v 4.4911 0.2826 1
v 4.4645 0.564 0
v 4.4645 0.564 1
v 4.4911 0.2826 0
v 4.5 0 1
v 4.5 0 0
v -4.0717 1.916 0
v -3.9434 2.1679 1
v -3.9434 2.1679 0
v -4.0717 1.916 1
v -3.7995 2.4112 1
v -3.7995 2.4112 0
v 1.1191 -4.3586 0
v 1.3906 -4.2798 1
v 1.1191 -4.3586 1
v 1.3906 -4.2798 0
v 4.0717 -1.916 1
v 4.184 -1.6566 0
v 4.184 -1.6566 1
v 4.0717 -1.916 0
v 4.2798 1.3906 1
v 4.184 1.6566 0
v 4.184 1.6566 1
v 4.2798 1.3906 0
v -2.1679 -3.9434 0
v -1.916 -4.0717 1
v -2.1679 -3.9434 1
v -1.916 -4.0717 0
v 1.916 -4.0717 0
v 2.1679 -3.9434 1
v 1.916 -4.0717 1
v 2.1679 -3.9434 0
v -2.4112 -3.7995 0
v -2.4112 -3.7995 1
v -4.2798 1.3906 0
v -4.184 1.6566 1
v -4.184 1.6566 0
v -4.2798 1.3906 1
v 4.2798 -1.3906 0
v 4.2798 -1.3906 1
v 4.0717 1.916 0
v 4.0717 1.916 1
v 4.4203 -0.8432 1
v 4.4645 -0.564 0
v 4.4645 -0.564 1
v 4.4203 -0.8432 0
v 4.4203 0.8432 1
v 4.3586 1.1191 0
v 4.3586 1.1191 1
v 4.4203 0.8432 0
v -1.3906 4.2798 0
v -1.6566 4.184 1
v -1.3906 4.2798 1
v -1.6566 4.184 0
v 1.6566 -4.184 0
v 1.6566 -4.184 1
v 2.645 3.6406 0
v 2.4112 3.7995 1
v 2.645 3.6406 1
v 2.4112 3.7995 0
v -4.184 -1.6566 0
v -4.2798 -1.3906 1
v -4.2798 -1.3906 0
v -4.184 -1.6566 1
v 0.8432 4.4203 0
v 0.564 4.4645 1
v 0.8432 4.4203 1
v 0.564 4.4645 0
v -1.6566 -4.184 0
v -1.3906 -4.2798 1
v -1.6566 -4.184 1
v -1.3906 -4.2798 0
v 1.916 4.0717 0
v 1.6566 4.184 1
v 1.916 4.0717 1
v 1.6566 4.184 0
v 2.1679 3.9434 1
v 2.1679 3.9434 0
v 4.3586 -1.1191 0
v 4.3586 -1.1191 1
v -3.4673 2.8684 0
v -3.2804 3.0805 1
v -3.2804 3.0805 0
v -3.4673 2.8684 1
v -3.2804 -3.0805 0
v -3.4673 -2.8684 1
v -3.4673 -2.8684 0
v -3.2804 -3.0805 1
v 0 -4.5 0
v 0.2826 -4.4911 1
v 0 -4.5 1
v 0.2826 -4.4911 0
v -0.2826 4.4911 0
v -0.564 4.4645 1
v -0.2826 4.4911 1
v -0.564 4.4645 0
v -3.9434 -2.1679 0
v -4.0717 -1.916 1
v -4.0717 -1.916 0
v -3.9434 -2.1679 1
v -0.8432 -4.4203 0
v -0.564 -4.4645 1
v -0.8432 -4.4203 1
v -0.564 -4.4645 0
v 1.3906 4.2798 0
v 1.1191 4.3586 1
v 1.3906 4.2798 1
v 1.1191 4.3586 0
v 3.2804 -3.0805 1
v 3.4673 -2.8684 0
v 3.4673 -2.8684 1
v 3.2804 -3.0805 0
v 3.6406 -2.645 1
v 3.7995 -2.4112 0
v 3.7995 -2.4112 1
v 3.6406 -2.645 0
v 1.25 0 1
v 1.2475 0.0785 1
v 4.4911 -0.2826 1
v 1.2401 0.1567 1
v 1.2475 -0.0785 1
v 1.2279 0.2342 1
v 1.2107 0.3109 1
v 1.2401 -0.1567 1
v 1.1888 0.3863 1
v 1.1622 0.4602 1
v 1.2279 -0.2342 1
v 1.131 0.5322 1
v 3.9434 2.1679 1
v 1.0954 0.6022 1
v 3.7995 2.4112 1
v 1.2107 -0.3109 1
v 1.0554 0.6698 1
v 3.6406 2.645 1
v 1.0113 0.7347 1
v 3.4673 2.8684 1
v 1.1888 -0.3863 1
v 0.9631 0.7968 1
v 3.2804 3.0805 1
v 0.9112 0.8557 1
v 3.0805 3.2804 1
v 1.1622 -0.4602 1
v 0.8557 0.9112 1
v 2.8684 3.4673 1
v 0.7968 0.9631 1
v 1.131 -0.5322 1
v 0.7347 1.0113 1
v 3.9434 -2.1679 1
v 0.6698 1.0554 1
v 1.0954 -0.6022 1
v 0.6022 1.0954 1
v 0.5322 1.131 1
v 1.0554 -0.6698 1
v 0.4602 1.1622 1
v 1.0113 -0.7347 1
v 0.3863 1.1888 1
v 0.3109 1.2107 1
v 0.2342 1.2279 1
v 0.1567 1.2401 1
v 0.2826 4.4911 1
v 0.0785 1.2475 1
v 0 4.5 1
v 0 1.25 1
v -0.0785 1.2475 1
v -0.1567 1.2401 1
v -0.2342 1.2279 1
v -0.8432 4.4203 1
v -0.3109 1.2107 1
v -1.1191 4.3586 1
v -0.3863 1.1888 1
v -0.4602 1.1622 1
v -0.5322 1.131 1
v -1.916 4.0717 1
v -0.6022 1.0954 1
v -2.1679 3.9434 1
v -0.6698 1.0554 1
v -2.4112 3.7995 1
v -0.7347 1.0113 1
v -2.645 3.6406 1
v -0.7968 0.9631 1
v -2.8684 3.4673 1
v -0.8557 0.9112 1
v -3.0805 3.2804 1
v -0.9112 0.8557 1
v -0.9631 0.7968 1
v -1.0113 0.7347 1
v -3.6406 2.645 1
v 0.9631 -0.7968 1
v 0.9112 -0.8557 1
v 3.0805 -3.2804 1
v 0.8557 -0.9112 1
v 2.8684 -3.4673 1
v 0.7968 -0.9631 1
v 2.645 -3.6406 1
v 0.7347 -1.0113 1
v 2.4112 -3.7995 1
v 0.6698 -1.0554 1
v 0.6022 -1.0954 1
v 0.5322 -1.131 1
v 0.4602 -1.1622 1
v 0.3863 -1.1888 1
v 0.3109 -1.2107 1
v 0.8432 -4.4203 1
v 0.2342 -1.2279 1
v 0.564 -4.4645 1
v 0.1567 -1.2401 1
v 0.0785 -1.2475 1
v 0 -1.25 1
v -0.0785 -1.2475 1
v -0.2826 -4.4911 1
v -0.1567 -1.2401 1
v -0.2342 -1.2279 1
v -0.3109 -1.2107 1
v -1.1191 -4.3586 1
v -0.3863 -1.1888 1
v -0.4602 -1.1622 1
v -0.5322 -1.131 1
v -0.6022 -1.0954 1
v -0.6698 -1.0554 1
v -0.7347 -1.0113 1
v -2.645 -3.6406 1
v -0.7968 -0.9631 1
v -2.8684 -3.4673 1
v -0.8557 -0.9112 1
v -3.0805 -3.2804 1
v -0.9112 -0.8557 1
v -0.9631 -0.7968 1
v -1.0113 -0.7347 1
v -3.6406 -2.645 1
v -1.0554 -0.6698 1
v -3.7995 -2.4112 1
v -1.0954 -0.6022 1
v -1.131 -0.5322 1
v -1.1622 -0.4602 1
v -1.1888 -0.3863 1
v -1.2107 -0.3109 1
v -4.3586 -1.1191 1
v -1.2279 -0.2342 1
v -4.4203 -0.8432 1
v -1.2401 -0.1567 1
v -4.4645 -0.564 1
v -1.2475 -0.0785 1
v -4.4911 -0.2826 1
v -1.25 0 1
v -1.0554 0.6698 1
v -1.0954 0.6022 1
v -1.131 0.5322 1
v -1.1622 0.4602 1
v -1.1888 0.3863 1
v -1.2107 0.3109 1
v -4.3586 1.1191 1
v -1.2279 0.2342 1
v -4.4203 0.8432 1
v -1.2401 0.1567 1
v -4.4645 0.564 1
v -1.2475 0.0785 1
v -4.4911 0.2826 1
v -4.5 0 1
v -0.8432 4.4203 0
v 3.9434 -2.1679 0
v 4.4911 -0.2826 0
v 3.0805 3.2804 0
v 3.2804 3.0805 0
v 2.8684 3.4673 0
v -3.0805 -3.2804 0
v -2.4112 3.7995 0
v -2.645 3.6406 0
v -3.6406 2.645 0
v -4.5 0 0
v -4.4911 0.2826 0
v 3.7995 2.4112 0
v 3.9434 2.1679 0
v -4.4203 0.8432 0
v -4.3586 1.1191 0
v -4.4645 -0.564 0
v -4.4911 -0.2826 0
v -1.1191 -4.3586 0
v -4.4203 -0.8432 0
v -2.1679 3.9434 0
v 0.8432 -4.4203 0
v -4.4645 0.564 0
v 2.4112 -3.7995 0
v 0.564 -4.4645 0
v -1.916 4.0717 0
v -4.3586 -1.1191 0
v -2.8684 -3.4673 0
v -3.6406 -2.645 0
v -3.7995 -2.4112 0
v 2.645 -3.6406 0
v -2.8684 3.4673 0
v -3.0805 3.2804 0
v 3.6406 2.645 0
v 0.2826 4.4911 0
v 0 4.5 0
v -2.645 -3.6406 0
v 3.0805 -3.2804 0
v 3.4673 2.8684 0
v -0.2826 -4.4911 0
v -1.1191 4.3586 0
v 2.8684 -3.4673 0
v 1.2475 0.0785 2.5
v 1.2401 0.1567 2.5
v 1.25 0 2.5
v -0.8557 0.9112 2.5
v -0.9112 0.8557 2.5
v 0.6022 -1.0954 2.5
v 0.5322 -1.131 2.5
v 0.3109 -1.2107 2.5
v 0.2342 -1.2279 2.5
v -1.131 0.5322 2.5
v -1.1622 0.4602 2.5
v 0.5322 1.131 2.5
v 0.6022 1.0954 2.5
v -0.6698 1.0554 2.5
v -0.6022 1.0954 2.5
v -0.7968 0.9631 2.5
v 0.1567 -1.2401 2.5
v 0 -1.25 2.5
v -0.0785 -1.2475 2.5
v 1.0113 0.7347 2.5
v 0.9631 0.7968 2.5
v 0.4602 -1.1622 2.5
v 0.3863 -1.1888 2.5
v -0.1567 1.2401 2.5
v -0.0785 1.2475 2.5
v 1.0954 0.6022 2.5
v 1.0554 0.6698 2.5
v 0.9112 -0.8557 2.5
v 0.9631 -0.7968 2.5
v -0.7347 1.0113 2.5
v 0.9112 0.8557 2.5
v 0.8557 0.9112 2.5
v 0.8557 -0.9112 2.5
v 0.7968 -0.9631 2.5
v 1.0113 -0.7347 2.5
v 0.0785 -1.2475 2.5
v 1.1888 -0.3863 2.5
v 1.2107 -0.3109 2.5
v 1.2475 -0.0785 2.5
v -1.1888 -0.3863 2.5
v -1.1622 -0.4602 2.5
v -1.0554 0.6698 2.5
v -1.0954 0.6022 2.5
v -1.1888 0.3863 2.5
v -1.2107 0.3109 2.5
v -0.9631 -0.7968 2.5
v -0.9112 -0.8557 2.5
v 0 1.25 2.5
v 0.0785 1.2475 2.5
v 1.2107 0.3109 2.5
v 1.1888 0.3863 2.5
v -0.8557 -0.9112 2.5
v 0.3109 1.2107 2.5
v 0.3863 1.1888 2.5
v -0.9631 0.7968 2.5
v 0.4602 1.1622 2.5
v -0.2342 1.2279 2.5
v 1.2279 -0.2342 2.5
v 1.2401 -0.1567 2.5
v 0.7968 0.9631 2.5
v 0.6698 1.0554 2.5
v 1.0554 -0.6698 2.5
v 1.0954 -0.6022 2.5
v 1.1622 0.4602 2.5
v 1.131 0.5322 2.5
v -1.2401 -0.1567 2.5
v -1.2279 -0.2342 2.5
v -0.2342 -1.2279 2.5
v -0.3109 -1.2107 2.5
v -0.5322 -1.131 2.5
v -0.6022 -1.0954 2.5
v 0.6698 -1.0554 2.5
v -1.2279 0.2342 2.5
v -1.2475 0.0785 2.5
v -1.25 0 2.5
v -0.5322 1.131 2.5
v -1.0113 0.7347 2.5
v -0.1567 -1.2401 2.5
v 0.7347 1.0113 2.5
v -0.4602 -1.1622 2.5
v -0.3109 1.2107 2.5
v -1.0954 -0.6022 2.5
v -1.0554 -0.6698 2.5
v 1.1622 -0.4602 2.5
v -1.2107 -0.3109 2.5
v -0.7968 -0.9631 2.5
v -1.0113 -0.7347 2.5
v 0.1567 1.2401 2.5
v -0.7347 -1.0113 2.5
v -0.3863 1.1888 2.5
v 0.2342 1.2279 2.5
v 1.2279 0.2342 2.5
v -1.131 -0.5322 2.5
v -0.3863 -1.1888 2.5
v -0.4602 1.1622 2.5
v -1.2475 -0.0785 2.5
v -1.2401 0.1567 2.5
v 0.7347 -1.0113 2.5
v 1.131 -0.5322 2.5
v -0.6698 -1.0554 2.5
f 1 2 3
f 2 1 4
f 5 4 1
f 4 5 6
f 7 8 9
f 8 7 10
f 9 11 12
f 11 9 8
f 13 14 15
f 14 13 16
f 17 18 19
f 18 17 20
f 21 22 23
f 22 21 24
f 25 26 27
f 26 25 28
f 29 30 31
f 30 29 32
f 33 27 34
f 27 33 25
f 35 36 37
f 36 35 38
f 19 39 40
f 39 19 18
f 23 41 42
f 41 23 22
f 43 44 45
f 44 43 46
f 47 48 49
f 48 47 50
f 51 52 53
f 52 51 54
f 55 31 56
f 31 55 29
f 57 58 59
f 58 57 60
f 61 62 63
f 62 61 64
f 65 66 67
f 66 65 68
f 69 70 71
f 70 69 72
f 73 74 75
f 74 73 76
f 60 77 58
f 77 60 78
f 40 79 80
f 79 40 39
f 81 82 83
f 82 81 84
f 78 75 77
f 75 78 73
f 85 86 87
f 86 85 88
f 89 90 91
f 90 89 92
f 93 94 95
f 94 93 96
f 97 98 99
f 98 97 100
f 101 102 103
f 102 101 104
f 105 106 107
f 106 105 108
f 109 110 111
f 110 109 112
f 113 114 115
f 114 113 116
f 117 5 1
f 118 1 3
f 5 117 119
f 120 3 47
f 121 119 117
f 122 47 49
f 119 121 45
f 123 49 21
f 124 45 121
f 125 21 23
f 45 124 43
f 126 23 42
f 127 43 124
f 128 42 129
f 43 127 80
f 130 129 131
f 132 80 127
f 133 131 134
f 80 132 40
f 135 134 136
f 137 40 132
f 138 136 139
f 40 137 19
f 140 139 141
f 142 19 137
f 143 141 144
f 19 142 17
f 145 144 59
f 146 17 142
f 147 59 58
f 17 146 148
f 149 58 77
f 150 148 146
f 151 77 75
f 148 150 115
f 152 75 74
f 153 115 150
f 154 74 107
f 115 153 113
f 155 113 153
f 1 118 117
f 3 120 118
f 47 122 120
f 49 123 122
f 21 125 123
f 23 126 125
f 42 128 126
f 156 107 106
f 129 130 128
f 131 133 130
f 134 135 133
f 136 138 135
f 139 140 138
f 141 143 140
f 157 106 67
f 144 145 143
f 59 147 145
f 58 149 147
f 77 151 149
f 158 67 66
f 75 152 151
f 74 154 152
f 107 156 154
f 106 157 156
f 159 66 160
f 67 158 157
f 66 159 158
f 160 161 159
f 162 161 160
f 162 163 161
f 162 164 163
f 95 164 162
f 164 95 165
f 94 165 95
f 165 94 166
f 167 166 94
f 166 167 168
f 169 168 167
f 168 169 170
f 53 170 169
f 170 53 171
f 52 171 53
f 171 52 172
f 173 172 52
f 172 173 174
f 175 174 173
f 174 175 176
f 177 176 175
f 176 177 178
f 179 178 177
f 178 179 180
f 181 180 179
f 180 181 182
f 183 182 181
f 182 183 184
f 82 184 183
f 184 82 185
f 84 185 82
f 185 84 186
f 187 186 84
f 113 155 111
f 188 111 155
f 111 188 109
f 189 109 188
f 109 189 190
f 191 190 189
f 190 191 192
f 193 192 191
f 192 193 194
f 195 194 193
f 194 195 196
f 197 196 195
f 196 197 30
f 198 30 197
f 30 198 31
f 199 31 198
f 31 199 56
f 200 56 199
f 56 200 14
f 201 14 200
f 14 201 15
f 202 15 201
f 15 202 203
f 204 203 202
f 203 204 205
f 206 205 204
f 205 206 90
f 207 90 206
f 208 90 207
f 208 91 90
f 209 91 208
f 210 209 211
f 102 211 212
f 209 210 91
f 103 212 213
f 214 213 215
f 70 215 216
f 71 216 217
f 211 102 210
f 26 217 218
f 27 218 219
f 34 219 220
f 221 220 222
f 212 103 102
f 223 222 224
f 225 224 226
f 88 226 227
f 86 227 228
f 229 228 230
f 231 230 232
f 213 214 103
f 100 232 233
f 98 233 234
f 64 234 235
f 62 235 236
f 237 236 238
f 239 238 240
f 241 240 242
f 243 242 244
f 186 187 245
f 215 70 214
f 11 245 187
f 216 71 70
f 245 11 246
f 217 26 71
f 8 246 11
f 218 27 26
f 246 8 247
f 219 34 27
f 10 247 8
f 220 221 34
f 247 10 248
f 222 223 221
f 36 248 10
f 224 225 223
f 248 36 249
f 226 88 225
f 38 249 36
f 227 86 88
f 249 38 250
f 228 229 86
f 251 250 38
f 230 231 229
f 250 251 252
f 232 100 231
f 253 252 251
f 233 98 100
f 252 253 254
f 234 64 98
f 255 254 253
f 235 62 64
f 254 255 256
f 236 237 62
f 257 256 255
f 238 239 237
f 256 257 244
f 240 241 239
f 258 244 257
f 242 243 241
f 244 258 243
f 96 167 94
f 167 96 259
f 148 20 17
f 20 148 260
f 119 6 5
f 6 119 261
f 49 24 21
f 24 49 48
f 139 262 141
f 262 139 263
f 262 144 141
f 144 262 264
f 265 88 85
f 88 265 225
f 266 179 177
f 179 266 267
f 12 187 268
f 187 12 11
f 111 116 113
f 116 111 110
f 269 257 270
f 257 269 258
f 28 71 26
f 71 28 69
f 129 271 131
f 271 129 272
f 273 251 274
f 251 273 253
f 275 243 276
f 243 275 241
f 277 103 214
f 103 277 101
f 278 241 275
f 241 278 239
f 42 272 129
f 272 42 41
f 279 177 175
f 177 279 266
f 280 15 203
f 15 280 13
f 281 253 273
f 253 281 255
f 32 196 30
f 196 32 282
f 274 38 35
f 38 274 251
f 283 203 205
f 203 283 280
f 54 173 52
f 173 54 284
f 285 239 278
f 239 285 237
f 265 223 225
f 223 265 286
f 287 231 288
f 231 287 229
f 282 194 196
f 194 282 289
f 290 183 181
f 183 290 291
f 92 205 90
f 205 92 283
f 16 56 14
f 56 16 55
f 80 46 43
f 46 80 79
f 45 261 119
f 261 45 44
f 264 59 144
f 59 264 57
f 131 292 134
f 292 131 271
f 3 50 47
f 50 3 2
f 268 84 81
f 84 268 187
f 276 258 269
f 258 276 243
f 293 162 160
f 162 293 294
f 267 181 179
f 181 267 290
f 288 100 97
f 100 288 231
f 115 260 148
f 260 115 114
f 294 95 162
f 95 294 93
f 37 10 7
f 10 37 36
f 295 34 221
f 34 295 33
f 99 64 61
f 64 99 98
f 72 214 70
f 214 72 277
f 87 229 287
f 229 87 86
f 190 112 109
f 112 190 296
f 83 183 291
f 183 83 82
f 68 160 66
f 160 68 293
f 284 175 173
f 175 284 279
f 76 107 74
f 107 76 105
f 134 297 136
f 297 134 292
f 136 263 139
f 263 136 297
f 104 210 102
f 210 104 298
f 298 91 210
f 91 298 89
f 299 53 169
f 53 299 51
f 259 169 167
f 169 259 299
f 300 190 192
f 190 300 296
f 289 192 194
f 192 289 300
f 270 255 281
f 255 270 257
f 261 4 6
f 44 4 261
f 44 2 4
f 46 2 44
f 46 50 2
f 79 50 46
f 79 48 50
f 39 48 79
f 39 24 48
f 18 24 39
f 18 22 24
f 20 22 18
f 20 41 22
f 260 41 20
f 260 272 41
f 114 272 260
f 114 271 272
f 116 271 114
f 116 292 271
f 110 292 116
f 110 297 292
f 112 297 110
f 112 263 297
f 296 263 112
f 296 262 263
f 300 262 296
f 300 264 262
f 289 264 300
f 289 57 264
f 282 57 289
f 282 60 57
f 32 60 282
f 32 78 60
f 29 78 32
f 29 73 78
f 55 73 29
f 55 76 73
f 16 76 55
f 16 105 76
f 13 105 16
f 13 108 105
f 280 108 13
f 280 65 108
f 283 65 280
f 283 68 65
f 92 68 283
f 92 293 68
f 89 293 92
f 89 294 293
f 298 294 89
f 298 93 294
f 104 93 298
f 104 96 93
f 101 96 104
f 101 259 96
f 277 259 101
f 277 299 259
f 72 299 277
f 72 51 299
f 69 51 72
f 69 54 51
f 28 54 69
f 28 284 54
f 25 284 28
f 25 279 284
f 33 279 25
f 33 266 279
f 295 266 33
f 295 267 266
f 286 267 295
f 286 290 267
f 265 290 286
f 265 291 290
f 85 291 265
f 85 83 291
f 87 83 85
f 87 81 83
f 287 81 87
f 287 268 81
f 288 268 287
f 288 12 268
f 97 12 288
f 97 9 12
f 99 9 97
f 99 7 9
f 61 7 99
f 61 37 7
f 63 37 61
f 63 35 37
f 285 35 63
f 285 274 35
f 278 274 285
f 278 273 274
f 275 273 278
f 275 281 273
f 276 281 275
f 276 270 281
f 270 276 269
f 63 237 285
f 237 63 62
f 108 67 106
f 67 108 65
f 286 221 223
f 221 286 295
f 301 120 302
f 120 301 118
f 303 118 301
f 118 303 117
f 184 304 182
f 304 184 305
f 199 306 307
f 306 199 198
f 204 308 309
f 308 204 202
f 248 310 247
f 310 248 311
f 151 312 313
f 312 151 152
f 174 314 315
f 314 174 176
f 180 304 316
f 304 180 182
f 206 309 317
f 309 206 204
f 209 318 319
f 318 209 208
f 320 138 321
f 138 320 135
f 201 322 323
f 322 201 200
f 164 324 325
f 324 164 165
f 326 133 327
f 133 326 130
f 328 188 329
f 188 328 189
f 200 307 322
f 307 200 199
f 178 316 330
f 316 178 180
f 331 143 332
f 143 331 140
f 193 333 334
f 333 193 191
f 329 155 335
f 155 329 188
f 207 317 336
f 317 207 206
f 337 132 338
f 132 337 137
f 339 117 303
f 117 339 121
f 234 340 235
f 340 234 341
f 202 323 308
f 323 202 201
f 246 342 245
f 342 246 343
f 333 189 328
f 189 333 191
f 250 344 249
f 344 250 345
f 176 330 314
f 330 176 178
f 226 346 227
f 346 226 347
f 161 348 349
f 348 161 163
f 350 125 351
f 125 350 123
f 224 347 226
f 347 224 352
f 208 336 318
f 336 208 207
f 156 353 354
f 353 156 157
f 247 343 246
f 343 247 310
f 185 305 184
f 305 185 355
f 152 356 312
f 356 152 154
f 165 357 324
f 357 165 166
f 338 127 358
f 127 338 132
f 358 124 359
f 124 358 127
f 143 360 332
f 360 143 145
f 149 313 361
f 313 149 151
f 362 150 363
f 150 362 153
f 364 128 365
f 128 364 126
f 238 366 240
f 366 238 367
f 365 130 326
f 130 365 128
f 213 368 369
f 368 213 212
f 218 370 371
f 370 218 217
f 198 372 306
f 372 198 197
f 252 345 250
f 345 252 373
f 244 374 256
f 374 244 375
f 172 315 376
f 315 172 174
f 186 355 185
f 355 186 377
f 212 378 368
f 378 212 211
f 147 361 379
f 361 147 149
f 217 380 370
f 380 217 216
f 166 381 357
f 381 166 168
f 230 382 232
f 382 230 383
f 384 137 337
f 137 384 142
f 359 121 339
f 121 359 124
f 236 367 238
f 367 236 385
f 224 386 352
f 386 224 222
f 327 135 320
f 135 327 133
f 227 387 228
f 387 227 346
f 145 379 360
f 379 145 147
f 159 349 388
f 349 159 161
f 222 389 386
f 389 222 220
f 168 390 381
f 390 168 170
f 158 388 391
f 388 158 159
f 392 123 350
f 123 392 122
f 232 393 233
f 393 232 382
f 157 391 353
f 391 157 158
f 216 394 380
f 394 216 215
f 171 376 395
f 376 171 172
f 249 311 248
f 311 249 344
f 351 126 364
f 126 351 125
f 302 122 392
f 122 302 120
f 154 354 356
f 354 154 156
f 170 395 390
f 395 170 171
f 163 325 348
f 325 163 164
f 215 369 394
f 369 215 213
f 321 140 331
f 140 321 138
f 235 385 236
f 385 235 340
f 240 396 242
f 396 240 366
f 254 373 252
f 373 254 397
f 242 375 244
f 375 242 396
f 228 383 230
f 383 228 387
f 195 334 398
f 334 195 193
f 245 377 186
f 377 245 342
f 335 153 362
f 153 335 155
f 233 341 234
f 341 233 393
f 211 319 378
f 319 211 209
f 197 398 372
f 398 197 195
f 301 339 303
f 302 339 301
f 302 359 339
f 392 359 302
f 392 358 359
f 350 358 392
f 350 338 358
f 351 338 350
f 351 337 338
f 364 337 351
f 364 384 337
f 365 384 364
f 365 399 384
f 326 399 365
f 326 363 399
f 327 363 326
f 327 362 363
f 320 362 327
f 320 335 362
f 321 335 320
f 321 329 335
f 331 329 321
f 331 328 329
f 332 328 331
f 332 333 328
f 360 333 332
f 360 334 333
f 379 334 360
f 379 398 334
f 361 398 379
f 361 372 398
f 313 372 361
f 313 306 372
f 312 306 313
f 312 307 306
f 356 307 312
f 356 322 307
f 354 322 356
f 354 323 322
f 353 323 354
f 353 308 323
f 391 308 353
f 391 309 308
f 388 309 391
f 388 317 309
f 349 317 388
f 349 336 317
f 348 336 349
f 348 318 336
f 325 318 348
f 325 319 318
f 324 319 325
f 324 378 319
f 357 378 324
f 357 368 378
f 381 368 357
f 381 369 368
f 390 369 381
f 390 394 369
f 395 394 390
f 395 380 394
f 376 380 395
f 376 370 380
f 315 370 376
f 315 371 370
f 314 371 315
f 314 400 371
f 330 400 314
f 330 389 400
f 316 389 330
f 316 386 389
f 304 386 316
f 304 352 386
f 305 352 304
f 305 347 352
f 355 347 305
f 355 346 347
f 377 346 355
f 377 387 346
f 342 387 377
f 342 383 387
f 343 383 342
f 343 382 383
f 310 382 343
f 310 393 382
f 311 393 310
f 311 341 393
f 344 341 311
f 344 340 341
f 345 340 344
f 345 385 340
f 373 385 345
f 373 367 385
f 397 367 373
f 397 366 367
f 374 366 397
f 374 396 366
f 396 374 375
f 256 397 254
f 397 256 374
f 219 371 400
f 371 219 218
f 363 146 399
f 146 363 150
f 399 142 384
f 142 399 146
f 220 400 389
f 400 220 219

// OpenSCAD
// file: constants.scad
// general print settings
tolerance = 0.1;
clearance = 0.1;
allowance = tolerance + clearance;

wall = 2;

// body
body_x = 45;
body_y = 75;
body_r = 3;
body_z = body_r * 2 + 3 + allowance * 2;

// arms 
arm_z = 3;
arm_x = 10;

open_width = 95;

arm_connection_r = arm_x / 2;
arm_connection_pin_r = arm_connection_r / 2;
arm_connection_pin_z = 15;

gripper_r = 5;
gripper_z = 15;

side_arm_y = open_width / 2 + gripper_r * 2 + arm_connection_r;

bottom_arm_y = 50;

pin_stopper_z = 1;

// arm cutouts
side_arm_channel_x = body_x;
side_arm_channel_y = 15;
bottom_arm_channel_x = arm_x + allowance;
bottom_arm_channel_y = body_y / 2;

// bottom arm guide
guide_x = wall;
guide_y = 10;
guide_z = body_z - wall * 2 - allowance;
guide_spacing = arm_x + allowance * 2;

// side arm pivot
pivot_r = 2;
pivot_z = body_z - wall * 2 - allowance;
pivot_y_pos = body_y / 2 - side_arm_channel_y / 2 - pivot_r;

// top stopper
stopper_x = arm_x;
stopper_y = wall;
stopper_z = body_z - wall * 2 - allowance;
stopper_y_pos = pivot_y_pos + pivot_r + arm_x + allowance;
stopper_x_pos = body_x / 2 - arm_x / 2;

// connection
connection_z = body_z - body_r * 2;
// file: openscad-generics/generics.scad
module rounded_cube(size, r_dim, center = false, sides_only = false){
	x_dim = size[0] - r_dim * 2;
	y_dim = size[1] - r_dim * 2;
	z_dim = size[2] + (sides_only ? -1 : -r_dim * 2); // need -1 because of cylinder height

	x = (center ? - size[0] / 2 : 0) + r_dim;
	y = (center ? - size[1] / 2 : 0) + r_dim;
	z = (center ? - size[2] / 2 : 0) + (sides_only ? 0 : r_dim);

	translate([x, y, z])
		minkowski(){
			cube([x_dim , y_dim, z_dim]);
			if (sides_only) cylinder(1, r=r_dim); else sphere(r_dim);
		}
}

module pill(size, r_dim, center = false) {
	x_dim = size[0] - r_dim * 2;
	y_dim = size[1] - r_dim * 2;
	z_dim = size[2] - r_dim * 2;

	r_top = x_dim / 2;
	y_cube = y_dim - r_top * 2;

	x = (center ? - size[0] / 2 : 0) + r_dim;
	y = (center ? - size[1] / 2 : 0) + r_dim;
	z = (center ? - size[2] / 2 : 0) + r_dim;
	
	translate([x, y, z]) {
		minkowski() {
			union() {
				for(y_pos = [r_top, y_dim - r_top]) {
					translate([r_top, y_pos, 0]) cylinder(z_dim, r=r_top);
				}
				translate([0, r_top, 0]) cube([x_dim, y_cube, z_dim]);
			}
			sphere(r_dim);
		}
	}
}

pill([50, 70, 10], 3);
// main file
use <openscad-generics/generics.scad>
include <constants.scad>

$fn=100;

*left_arm();
*right_arm();
*bottom_arm();
*arm_pin_bottom();
arm_pin_top();

module connection_pin_cutout() {
	x_pos = arm_x / 2;
	y_pos = arm_connection_r;
	z_pos = 0;

	z_dim = arm_z;
	r_dim = arm_connection_pin_r + allowance;

	translate([x_pos, y_pos, z_pos]) cylinder(z_dim, r=r_dim);
}

module side_arm_gripper() {
	x_pos = arm_x / 2;
	y_pos = side_arm_y - gripper_r;
	z_pos = arm_z;

	stopper_z_pos = z_pos + gripper_z;
	stopper_r = gripper_r + wall;

	translate([x_pos, y_pos, z_pos]) cylinder(gripper_z, r=gripper_r);
	translate([x_pos, y_pos, stopper_z_pos]) cylinder(wall, r=stopper_r);
}

module side_arm() {
	difference () {
		union() {
			pill([arm_x, side_arm_y, arm_z], 0);
			side_arm_gripper();
		}

		connection_pin_cutout();
	}
}

module left_arm() {
	difference() {
		side_arm();

		// connection thinning
		thinning_x = arm_x;
		thinning_y = arm_x;
		thinning_z = arm_z * 2 / 3 + tolerance / 2;

		thinning_x_pos = 0;
		thinning_y_pos = 0;
		thinning_z_pos = arm_z / 3 - tolerance / 2;
		translate([thinning_x_pos, thinning_y_pos, thinning_z_pos]) cube([thinning_x, thinning_y, thinning_z]);
	}
}

module right_arm() {
	difference() {
		side_arm();

		// connection thinning
		thinning_x = arm_x;
		thinning_y = arm_x;
		thinning_z = arm_z * 2 / 3 + tolerance / 2;

		thinning_x_pos = 0;
		thinning_y_pos = 0;
		thinning_z_pos = 0;
		translate([thinning_x_pos, thinning_y_pos, thinning_z_pos]) cube([thinning_x, thinning_y, thinning_z]);
	}
}

module bottom_arm_gripper() {
	x_pos = 0;
	y_pos = bottom_arm_y;
	z_pos = 0;

	translate([x_pos, y_pos, z_pos]) union() {
		// square off arm
		translate([0, -arm_x, 0]) cube([arm_x, arm_x, arm_z]);

		cube([arm_x, wall, gripper_z + wall]);
		translate([0, - wall, gripper_z + wall]) cube([arm_x, wall * 2, wall]);
	}
}

module bottom_arm() {
	difference() {
		pill([arm_x, bottom_arm_y, arm_z], 0);

		// connection thinning
		thinning_x = arm_x;
		thinning_y = arm_x;
		thinning_z = arm_z / 3 + tolerance / 2;

		thinning_x_pos = 0;
		thinning_y_pos = 0;
		thinning_z_pos_list = [0, arm_z * 2 / 3 - tolerance / 2];
		
		for (thinning_z_pos = thinning_z_pos_list)
			translate([thinning_x_pos, thinning_y_pos, thinning_z_pos]) cube([thinning_x, thinning_y, thinning_z]);

		connection_pin_cutout();
	}

	bottom_arm_gripper();
}


// these are currently temporary. might want something better
module arm_pin_bottom() {
	difference() {
		union() {
			cylinder(pin_stopper_z, r=arm_connection_pin_r + wall);
			translate([0, 0, pin_stopper_z]) cylinder(arm_z, r=arm_connection_pin_r);
		}
		translate([0, 0, pin_stopper_z + arm_z / 2]) cylinder(arm_z / 2, r=arm_connection_pin_r / 2 + tolerance);
	}
}

module arm_pin_top() {
	cylinder(pin_stopper_z, r=arm_connection_pin_r + wall);
	translate([0, 0, pin_stopper_z]) cylinder(arm_z / 2, r=arm_connection_pin_r / 2);
}
